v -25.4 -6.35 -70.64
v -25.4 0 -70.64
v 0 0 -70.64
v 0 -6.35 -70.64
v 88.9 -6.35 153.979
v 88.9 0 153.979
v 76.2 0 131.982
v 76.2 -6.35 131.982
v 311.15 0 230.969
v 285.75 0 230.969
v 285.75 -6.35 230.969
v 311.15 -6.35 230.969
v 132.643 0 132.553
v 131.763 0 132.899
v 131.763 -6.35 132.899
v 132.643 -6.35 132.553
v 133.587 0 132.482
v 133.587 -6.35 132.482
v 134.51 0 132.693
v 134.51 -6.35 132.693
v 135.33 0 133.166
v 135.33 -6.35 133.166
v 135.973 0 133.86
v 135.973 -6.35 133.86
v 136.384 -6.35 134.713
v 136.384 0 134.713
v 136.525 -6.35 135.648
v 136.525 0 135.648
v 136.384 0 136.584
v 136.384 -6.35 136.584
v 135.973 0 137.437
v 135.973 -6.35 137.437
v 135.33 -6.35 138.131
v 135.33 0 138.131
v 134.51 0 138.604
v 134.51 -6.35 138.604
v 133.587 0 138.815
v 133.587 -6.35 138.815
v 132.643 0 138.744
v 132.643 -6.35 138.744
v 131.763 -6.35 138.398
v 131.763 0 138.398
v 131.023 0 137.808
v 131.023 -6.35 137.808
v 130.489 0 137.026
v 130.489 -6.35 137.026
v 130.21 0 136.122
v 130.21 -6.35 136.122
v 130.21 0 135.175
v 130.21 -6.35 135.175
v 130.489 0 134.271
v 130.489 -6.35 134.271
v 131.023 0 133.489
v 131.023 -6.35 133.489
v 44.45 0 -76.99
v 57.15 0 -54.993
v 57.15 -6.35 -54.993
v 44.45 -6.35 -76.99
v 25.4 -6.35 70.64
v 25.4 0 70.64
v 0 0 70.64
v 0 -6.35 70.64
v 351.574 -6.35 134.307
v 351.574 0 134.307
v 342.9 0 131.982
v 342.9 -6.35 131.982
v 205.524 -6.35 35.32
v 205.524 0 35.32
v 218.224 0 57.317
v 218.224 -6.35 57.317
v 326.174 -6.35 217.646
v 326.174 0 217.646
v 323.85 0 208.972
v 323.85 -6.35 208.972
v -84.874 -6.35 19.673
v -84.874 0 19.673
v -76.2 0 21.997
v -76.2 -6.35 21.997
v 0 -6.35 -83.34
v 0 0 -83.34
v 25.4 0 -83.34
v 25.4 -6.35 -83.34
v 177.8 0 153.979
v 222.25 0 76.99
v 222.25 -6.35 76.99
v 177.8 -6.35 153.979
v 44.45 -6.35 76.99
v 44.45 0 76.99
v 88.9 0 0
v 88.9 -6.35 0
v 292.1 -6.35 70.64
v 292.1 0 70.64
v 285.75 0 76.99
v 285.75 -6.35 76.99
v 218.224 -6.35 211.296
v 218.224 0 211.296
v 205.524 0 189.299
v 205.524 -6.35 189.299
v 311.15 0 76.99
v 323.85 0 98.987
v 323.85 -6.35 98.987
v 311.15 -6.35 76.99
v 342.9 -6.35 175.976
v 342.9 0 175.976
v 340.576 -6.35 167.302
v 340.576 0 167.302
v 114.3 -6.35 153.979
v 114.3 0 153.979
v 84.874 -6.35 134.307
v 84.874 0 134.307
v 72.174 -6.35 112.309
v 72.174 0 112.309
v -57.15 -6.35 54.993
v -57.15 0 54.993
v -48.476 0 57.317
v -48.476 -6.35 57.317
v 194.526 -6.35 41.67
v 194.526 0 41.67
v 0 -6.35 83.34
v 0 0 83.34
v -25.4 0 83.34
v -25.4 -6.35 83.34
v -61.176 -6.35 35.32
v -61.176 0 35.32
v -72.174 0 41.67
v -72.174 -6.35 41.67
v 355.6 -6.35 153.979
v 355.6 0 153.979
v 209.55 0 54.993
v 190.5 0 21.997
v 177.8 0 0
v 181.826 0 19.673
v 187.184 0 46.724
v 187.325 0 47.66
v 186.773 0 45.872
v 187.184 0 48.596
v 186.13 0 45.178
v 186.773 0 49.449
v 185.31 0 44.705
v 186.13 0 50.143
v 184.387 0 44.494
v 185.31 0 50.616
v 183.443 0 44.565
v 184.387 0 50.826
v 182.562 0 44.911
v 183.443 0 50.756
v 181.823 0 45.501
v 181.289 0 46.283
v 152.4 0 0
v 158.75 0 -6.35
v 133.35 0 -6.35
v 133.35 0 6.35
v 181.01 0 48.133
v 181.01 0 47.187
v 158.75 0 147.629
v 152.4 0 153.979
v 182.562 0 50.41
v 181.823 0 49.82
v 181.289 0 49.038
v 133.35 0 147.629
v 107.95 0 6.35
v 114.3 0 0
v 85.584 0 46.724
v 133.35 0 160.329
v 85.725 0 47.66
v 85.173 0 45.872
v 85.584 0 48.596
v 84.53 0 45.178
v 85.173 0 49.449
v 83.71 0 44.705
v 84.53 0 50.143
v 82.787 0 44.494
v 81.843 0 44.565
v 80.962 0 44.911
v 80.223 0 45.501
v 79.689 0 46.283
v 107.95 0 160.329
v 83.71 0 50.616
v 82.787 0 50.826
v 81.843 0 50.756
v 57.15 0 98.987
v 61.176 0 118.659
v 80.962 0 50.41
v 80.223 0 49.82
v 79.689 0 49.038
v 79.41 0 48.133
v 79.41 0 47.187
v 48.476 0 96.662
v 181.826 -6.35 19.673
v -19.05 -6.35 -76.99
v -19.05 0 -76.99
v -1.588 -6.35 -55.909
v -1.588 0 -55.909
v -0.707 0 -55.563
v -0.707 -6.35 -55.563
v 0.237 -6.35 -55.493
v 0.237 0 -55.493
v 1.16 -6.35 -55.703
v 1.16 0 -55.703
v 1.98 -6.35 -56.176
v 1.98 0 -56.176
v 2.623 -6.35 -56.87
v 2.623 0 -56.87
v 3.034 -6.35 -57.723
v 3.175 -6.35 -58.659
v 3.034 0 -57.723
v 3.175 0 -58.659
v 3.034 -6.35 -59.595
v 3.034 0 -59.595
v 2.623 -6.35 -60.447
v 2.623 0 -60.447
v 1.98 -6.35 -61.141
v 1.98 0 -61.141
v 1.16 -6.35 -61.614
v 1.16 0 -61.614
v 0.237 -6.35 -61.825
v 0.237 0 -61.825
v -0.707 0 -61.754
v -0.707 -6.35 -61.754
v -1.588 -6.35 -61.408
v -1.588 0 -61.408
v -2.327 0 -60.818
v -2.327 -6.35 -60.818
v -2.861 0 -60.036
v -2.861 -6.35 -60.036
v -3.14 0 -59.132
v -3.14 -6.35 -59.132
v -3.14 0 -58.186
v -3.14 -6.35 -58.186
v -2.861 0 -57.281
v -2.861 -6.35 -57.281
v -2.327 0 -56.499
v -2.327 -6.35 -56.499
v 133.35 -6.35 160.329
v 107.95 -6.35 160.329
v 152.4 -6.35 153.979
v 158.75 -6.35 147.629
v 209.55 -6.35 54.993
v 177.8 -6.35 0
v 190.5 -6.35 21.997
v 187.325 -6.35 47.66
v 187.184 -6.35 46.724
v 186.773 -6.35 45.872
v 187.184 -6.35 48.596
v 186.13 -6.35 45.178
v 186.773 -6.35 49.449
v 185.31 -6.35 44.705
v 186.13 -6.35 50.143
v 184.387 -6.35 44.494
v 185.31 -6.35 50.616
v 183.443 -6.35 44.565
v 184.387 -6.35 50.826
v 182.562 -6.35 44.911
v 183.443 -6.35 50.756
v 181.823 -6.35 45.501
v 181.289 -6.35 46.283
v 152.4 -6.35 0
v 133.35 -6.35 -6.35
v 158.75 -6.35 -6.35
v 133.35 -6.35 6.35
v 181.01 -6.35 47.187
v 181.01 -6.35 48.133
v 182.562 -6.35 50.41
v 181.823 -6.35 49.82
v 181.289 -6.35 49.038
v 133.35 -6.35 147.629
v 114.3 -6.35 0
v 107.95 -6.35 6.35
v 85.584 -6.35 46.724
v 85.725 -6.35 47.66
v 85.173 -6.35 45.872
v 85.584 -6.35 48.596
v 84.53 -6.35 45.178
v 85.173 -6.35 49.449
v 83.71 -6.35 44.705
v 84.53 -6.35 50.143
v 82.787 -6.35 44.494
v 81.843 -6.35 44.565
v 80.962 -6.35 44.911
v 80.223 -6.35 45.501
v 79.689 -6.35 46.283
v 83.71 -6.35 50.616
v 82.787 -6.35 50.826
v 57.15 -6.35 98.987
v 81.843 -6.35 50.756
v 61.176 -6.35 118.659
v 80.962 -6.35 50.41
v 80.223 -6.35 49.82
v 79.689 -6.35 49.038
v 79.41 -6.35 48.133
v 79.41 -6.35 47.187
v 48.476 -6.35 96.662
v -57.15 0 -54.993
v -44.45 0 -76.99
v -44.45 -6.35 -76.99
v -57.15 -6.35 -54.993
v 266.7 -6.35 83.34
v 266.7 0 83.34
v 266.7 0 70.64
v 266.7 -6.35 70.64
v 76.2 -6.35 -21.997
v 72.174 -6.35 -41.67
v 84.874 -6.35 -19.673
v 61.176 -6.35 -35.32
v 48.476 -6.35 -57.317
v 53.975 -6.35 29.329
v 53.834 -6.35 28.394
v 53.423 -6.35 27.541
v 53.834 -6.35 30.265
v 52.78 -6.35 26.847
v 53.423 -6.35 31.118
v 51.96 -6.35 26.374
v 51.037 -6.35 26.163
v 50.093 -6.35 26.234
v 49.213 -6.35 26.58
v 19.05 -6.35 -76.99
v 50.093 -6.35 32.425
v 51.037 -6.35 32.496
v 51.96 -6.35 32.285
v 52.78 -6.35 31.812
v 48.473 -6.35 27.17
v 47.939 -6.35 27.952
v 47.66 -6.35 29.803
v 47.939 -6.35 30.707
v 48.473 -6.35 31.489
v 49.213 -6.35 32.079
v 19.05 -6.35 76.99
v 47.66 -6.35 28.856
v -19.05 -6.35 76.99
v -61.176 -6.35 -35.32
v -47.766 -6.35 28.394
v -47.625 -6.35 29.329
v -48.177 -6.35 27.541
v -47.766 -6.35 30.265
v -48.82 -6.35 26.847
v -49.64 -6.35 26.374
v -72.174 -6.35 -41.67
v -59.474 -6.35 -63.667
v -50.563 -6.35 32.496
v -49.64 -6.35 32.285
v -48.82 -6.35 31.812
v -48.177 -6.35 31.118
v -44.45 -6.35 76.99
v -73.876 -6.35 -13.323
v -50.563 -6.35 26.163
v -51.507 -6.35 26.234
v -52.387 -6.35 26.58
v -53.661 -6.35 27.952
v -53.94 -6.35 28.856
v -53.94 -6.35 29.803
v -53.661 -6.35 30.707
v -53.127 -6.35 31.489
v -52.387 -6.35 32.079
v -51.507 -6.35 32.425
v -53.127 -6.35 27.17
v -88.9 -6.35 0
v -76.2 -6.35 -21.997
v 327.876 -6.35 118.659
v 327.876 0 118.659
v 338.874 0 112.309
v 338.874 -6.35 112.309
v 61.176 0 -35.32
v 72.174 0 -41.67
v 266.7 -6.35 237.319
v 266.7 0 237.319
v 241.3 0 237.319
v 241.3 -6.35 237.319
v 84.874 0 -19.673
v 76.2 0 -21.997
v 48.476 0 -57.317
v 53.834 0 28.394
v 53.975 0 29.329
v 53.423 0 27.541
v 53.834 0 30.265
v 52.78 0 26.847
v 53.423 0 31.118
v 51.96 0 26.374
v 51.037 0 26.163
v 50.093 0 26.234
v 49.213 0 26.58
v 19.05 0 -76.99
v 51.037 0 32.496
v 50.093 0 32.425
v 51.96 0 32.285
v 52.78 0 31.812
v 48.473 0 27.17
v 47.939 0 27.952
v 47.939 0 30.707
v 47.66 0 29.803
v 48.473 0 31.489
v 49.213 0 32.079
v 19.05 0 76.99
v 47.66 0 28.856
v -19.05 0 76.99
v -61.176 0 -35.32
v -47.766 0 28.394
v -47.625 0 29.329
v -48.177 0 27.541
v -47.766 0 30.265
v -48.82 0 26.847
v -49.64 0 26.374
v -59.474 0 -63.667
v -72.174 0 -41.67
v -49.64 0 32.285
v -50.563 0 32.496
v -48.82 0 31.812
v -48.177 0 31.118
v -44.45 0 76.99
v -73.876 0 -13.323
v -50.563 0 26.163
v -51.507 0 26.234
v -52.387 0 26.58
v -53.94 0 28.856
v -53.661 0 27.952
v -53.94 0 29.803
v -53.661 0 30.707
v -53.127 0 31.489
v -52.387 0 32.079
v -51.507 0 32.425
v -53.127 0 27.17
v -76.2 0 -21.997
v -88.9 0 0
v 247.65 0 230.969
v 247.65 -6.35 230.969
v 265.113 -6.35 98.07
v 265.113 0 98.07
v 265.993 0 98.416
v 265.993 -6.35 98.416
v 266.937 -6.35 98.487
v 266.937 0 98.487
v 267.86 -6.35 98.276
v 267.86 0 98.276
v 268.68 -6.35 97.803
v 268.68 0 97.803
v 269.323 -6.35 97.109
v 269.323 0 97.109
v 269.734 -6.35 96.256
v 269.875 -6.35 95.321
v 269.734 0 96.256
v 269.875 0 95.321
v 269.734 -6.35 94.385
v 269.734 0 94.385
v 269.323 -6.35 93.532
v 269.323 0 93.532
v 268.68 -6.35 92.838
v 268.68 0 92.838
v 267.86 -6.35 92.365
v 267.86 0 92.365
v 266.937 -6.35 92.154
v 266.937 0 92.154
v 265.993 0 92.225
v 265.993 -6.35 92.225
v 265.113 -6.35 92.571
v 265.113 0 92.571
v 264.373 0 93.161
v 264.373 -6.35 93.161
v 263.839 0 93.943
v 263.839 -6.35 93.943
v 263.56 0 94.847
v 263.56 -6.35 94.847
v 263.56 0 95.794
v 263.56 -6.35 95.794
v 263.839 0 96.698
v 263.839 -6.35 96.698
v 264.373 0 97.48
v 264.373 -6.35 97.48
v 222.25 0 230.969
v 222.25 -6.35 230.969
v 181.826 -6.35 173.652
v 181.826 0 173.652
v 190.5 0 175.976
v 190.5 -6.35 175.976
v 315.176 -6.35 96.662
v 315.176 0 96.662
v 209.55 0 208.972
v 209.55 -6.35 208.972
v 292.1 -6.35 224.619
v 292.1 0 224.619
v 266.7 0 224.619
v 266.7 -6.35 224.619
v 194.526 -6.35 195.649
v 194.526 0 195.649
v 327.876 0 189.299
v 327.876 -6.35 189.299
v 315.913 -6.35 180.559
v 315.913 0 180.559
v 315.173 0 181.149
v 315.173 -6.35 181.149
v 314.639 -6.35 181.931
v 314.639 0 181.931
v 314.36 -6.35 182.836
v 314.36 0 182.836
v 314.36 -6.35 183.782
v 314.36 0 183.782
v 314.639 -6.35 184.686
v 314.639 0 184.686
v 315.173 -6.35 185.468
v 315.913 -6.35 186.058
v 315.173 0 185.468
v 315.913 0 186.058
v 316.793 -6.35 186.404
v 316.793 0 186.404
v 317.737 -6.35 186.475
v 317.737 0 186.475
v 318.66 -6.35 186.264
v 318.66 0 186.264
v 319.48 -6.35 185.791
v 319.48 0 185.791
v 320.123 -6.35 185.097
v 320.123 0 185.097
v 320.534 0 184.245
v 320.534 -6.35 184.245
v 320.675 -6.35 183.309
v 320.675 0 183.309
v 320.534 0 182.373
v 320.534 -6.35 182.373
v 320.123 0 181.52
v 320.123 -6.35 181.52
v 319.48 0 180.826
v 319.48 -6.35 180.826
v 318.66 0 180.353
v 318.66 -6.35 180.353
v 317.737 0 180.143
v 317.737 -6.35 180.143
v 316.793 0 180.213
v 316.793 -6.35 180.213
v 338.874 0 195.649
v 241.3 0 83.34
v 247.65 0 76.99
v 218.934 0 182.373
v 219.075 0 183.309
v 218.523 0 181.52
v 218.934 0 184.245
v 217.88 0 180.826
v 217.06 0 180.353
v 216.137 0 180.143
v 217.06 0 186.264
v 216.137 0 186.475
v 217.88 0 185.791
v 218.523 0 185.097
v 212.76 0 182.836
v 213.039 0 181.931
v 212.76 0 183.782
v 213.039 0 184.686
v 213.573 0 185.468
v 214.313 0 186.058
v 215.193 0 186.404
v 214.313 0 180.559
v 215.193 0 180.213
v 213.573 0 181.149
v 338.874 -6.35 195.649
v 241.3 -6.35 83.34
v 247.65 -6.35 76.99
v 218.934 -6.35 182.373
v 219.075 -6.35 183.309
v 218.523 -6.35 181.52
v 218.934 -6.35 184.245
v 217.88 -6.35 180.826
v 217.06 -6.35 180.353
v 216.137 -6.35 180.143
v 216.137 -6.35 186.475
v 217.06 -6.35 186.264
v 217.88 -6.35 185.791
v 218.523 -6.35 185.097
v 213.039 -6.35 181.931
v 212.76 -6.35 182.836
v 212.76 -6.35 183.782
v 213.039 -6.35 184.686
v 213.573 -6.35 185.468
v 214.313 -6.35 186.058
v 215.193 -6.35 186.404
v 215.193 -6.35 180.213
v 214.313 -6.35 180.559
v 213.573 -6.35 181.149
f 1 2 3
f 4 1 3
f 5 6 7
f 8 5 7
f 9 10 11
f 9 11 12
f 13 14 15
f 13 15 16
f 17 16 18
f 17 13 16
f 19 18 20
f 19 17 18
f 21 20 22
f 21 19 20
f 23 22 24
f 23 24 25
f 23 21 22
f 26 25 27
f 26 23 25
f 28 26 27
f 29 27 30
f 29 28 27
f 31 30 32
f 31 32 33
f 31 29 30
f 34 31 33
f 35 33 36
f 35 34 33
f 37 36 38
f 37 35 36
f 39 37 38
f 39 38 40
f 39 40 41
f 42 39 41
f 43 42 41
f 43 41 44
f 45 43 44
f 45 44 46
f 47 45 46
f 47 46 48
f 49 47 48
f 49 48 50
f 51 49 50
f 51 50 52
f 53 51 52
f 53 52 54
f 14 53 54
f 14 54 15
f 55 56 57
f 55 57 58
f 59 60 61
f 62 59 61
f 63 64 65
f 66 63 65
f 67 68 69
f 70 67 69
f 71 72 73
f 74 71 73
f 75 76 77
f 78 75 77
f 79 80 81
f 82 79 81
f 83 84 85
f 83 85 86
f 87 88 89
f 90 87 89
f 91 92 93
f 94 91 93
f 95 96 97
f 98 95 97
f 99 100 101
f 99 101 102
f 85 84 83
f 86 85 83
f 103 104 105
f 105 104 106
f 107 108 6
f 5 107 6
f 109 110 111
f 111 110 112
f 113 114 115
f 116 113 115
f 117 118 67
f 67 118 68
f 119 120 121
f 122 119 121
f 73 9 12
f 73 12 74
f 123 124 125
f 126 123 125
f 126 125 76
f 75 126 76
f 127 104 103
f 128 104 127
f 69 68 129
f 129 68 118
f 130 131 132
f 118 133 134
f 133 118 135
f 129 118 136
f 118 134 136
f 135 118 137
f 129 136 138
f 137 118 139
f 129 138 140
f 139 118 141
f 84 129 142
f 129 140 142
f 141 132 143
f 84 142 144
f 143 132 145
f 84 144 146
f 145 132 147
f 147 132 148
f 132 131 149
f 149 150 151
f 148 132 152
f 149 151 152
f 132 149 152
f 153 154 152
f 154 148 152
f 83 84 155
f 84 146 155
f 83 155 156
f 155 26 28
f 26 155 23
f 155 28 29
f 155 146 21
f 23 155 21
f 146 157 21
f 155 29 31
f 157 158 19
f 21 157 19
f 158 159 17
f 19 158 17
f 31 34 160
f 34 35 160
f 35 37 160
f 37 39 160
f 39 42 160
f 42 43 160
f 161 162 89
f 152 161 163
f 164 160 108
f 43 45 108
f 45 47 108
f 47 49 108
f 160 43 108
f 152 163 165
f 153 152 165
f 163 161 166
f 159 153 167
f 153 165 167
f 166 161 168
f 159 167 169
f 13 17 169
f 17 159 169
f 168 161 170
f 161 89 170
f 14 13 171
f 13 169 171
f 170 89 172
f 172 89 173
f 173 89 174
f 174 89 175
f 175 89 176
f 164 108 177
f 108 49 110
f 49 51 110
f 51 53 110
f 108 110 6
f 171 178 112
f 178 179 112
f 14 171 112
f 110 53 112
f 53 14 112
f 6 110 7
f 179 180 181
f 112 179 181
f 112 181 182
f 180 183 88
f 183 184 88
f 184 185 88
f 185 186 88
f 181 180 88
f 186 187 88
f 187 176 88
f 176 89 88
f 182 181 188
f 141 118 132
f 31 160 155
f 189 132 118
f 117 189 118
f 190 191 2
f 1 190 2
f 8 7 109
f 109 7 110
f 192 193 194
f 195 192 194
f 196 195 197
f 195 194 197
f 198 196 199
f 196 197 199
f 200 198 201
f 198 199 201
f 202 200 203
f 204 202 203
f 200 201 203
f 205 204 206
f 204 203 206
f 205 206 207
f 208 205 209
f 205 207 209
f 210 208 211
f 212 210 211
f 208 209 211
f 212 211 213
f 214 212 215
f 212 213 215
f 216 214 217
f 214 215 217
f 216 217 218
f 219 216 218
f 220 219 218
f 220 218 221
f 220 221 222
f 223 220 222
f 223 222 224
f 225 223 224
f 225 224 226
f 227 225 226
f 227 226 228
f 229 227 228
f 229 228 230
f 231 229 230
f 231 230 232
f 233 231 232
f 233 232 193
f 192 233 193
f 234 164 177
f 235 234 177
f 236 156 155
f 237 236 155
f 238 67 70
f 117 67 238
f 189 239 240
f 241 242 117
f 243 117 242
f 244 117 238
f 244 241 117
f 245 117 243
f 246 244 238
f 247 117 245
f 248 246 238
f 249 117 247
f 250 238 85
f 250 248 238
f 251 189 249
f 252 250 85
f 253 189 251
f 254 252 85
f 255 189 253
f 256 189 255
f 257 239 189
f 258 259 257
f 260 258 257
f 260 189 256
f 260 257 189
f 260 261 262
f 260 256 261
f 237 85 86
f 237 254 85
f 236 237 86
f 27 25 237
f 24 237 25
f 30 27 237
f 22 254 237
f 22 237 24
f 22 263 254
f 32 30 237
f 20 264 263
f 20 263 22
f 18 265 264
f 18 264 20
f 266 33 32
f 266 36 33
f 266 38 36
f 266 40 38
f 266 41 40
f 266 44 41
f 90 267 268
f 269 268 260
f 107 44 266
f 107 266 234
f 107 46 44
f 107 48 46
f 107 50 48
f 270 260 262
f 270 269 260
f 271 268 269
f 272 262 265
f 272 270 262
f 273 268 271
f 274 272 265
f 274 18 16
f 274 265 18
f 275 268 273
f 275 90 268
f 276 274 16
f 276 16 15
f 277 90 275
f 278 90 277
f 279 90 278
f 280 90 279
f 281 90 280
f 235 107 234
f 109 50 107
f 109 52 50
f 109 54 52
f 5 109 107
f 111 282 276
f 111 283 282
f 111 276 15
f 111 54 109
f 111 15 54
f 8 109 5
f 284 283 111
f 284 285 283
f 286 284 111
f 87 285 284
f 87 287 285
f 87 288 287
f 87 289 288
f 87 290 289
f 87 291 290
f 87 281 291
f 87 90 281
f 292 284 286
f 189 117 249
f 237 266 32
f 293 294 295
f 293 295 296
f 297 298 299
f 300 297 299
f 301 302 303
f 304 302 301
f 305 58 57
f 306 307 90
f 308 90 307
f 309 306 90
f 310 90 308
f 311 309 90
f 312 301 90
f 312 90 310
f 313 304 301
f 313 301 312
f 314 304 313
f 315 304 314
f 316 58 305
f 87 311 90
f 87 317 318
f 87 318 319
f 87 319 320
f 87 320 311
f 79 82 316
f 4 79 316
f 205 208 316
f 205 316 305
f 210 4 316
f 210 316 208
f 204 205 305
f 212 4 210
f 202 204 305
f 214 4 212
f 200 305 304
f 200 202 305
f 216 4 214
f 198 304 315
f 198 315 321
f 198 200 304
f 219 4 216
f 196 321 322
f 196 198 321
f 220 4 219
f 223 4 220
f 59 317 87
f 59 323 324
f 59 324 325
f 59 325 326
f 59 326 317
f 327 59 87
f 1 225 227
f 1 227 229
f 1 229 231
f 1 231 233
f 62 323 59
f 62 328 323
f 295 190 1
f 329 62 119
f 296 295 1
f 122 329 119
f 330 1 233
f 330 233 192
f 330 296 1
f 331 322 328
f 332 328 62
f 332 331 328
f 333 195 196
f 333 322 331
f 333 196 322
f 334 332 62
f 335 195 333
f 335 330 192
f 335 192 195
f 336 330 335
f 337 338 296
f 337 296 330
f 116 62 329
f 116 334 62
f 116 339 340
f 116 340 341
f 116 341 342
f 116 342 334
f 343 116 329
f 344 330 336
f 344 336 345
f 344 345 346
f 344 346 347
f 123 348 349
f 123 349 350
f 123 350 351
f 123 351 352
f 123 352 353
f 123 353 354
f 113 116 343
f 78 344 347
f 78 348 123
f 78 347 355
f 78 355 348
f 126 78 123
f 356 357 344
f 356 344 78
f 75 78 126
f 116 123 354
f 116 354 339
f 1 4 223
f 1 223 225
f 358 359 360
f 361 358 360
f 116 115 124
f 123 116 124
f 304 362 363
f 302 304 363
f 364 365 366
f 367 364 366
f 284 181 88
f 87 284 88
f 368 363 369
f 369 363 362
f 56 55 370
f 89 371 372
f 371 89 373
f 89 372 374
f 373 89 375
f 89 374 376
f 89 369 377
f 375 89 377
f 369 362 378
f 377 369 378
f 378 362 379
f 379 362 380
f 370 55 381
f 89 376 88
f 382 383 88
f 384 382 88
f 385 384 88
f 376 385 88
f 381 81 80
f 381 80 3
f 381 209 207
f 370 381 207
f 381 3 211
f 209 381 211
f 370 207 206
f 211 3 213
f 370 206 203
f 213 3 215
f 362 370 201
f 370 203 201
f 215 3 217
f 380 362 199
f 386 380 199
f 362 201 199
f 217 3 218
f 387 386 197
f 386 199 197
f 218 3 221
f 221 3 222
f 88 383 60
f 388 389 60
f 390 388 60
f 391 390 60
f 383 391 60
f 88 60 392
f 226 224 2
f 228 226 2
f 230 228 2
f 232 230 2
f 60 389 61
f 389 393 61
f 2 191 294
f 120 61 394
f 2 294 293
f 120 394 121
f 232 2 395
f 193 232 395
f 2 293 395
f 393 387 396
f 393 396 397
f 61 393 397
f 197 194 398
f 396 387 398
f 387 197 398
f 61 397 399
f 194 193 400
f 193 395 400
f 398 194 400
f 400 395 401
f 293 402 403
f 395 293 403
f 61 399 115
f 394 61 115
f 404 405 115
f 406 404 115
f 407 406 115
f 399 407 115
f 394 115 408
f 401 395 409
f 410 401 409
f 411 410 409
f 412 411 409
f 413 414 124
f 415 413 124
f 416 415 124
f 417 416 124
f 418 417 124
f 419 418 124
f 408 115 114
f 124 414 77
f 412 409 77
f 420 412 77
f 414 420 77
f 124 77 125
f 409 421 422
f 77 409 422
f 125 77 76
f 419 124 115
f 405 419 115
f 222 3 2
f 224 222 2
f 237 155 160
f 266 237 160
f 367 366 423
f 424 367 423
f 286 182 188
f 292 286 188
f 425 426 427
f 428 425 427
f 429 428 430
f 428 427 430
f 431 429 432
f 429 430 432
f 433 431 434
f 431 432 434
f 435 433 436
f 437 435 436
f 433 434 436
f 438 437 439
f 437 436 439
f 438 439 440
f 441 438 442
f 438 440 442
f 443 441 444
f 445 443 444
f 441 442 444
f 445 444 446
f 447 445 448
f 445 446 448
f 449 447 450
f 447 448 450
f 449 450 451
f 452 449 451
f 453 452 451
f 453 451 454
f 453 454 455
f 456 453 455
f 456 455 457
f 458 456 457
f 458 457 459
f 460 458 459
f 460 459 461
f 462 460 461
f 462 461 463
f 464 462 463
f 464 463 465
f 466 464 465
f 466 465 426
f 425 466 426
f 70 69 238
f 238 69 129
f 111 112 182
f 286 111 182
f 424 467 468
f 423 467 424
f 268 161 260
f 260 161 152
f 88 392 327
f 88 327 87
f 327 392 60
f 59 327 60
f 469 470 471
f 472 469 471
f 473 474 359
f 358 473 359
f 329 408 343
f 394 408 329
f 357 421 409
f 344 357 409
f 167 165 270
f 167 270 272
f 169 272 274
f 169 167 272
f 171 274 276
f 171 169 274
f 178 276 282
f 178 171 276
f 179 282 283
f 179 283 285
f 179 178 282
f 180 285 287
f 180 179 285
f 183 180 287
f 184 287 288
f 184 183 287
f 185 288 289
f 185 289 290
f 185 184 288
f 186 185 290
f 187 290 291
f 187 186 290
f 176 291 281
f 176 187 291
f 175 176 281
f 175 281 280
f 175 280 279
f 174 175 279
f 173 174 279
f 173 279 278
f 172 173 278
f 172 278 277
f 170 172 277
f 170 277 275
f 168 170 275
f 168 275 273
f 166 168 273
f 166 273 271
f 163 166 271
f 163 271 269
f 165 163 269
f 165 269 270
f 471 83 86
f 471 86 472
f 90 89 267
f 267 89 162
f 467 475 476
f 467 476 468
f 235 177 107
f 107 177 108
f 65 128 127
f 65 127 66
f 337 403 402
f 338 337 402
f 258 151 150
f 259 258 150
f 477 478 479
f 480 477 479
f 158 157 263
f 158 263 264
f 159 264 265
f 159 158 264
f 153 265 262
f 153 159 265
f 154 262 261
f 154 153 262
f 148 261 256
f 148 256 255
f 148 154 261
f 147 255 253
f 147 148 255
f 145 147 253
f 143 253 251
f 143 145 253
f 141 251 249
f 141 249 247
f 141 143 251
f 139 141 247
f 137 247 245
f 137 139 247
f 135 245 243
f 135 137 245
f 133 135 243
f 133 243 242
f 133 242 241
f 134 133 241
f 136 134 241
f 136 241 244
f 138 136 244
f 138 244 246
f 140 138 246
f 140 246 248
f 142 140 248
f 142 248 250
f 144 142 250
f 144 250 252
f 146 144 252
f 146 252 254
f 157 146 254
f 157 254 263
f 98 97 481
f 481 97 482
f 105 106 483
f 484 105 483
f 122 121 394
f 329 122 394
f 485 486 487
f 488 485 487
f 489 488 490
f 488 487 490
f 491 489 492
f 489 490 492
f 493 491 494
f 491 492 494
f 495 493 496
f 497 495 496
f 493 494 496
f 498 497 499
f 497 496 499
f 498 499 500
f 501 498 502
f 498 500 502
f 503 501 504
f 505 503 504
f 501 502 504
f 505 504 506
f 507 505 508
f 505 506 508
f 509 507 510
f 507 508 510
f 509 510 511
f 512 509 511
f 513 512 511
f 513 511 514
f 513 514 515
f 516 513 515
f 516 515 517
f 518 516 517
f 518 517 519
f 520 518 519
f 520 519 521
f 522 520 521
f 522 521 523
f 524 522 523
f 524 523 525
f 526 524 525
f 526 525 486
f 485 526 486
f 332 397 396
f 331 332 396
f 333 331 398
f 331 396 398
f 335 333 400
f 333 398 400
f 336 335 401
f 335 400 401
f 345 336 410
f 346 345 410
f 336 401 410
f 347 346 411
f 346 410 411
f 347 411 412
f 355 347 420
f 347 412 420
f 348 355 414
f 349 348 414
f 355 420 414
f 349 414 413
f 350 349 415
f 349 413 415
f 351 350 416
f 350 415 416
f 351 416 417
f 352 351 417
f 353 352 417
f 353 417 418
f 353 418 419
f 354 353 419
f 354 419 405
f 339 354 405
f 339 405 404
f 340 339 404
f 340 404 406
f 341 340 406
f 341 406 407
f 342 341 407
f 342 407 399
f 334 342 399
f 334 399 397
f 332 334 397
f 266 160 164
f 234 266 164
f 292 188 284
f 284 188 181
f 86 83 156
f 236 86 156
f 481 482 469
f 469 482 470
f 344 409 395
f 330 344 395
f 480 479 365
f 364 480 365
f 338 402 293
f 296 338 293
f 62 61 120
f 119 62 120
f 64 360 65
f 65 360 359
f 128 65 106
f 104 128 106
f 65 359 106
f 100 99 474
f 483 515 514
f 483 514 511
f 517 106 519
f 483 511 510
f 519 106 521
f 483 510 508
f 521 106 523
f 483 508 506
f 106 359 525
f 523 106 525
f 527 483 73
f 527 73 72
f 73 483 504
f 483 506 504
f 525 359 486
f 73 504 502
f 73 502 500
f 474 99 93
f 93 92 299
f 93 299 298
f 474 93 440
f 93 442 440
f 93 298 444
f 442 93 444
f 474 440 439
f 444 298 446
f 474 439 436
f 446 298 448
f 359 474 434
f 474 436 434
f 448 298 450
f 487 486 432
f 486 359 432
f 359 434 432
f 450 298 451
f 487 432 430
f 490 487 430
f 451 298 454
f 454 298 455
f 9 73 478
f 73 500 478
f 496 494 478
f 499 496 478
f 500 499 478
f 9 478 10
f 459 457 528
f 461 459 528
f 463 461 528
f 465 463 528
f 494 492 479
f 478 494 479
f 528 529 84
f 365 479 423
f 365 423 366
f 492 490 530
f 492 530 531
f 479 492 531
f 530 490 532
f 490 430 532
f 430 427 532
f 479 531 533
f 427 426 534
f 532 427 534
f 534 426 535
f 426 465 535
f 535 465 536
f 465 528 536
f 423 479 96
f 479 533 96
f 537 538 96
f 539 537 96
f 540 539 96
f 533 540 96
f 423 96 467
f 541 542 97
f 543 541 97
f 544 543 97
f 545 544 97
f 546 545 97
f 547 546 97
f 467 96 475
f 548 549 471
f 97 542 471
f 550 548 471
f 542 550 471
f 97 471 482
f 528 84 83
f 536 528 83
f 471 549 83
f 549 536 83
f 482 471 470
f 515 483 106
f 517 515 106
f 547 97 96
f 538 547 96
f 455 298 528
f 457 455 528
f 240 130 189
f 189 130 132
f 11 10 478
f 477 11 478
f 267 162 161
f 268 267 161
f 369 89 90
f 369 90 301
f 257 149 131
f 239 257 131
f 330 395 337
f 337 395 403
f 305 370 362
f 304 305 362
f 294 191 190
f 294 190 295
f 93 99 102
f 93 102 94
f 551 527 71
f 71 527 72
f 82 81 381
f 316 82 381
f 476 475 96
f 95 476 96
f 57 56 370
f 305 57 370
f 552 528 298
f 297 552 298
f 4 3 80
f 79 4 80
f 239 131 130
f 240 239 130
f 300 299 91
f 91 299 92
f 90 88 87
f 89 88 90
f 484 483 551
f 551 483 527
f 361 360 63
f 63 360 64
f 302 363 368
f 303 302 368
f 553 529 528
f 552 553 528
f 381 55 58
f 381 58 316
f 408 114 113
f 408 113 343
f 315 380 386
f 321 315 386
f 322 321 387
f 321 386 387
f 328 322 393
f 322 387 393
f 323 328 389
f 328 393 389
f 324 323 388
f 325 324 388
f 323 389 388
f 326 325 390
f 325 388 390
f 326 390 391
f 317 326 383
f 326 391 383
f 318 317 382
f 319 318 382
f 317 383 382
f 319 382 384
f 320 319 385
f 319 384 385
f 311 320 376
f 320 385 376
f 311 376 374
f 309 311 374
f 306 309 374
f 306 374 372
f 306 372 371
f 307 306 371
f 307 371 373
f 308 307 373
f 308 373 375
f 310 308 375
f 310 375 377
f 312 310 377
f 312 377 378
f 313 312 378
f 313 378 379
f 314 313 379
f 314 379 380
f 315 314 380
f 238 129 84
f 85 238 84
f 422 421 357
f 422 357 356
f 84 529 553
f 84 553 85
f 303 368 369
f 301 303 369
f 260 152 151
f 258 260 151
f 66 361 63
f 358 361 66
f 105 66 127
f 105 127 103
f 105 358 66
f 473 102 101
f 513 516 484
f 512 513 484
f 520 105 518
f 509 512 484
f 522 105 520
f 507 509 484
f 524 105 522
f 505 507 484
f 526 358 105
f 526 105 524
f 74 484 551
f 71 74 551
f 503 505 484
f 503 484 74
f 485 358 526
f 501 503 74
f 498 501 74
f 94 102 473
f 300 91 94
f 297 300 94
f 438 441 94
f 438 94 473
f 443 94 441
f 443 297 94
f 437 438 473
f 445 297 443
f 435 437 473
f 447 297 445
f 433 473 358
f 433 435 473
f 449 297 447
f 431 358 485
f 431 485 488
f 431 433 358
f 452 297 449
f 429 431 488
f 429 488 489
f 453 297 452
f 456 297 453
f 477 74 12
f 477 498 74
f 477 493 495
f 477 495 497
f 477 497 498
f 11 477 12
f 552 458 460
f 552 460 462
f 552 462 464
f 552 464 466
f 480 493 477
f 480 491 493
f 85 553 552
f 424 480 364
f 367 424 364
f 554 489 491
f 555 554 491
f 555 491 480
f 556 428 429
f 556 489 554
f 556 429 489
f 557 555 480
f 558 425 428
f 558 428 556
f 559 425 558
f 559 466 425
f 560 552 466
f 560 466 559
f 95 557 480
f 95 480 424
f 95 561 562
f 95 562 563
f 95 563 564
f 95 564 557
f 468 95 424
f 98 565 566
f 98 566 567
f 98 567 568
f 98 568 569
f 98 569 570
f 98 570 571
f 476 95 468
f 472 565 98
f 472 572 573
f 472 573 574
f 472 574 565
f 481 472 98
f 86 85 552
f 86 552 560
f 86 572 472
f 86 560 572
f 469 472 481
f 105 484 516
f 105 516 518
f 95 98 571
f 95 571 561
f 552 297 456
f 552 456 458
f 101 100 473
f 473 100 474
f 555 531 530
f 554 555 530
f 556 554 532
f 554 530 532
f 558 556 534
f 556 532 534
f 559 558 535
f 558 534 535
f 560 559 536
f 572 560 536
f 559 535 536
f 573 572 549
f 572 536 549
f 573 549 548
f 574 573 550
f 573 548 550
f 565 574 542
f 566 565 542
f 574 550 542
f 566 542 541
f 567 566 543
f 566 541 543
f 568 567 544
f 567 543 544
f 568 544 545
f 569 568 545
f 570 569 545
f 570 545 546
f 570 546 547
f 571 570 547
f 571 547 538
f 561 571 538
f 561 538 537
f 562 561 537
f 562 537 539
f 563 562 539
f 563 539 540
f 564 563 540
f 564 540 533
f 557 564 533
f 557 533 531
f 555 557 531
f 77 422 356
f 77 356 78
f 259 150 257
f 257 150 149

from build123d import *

# Parameters (mm, degrees)
BOSS_EXTRUDE1_DEPTH = 6.35
SKETCH9_R           = 3.175
CUT_EXTRUDE3_DEPTH  = 7.35
CIRPATTERN6_COUNT   = 3
CUT_EXTRUDE4_DEPTH  = 7.35
BOSS_EXTRUDE4_DEPTH = 6.35
CIRPATTERN7_COUNT   = 6
CUT_EXTRUDE5_DEPTH  = 7.35
BOSS_EXTRUDE5_DEPTH = 6.35
CIRPATTERN8_COUNT   = 6
CUT_EXTRUDE6_DEPTH  = 7.35
BOSS_EXTRUDE6_DEPTH = 6.35
CIRPATTERN9_COUNT   = 6


with BuildPart() as part:
    # Sketch1 → Boss-Extrude1 (new body)
    with BuildSketch(Plane(origin=(0, 0, 0), x_dir=(1, 0, 0), z_dir=(0, 1, 0))):
        Polygon((88.9, 0), (44.45, 76.989658396), (-44.45, 76.989658396), (-88.9, 0), (-44.45, -76.989658396), (44.45, -76.989658396), align=None)
    extrude(amount=-BOSS_EXTRUDE1_DEPTH)

    # Sketch9 → Cut-Extrude3 (cut, through all)
    with BuildSketch(Plane(origin=(0, 0, 0), x_dir=(1, 0, 0), z_dir=(0, 1, 0))):
        with Locations((-50.8, -29.329393675)):
            Circle(SKETCH9_R)
    cut_extrude3 = extrude(amount=-CUT_EXTRUDE3_DEPTH, mode=Mode.SUBTRACT)

    # CirPattern6: Cut-Extrude3 ×3 about axis
    cirpattern6_axis = Axis((0, 0, 0), (0, 1, 0))
    for i in range(1, CIRPATTERN6_COUNT):
        add(cut_extrude3.rotate(cirpattern6_axis, i * 360 / CIRPATTERN6_COUNT), mode=Mode.SUBTRACT)


with BuildPart() as body_2:
    # Mirror3: mirrored copy
    add(part.part.mirror(Plane(origin=(44.45, -6.35, 76.989658396), x_dir=(-0.5, 0, 0.866025404), z_dir=(0.866025404, 0, 0.5))))


with BuildPart() as part_1:
    add(part.part)

    # Sketch10 → Cut-Extrude4 (cut, through all)
    with BuildSketch(Plane(origin=(0, 0, 0), x_dir=(1, 0, 0), z_dir=(0, 1, 0))):
        Polygon((57.15, 54.99261314), (48.475738686, 57.316874454), (61.175738686, 35.319829198), (66.675, 38.494829198), align=None)
    cut_extrude4 = extrude(amount=-CUT_EXTRUDE4_DEPTH, mode=Mode.SUBTRACT)

    # Sketch11 → Boss-Extrude4 (add)
    with BuildSketch(Plane(origin=(0, 0, 0), x_dir=(1, 0, 0), z_dir=(0, 1, 0))):
        Polygon((66.675, 38.494829198), (72.174261314, 41.669829198), (84.874261314, 19.672783942), (76.2, 21.997045256), align=None)
    boss_extrude4 = extrude(amount=-BOSS_EXTRUDE4_DEPTH)

    # CirPattern7: Cut-Extrude4, Boss-Extrude4 ×6 about axis, 1 skipped
    cirpattern7_axis = Axis((0, 0, 0), (0, 1, 0))
    add([cut_extrude4.rotate(cirpattern7_axis, i * 360 / CIRPATTERN7_COUNT) for i in range(1, CIRPATTERN7_COUNT) if i not in (5,)], mode=Mode.SUBTRACT)
    add([boss_extrude4.rotate(cirpattern7_axis, i * 360 / CIRPATTERN7_COUNT) for i in range(1, CIRPATTERN7_COUNT) if i not in (5,)])


with BuildPart() as body_3:
    # Mirror4: mirrored copy
    add(body_2.part.mirror(Plane(origin=(222.25, -6.35, 76.989658396), x_dir=(-0.5, 0, 0.866025404), z_dir=(0.866025404, 0, 0.5))))

    # Sketch16 → Cut-Extrude6 (cut, through all)
    with BuildSketch(Plane(origin=(0, 0, 0), x_dir=(1, 0, 0), z_dir=(0, 1, 0))):
        Polygon((323.85, -98.986703653), (315.175738686, -96.662442339), (327.875738686, -118.659487595), (333.375, -115.484487595), align=None)
    cut_extrude6 = extrude(amount=-CUT_EXTRUDE6_DEPTH, mode=Mode.SUBTRACT)

    # Sketch17 → Boss-Extrude6 (add)
    with BuildSketch(Plane(origin=(0, 0, 0), x_dir=(1, 0, 0), z_dir=(0, 1, 0))):
        Polygon((333.375, -115.484487595), (338.874261314, -112.309487595), (351.574261314, -134.306532851), (342.9, -131.982271537), align=None)
    boss_extrude6 = extrude(amount=-BOSS_EXTRUDE6_DEPTH)

    # CirPattern9: Cut-Extrude6, Boss-Extrude6 ×6 about axis, 1 skipped
    cirpattern9_axis = Axis((266.7, 0, 153.979316793), (0, 1, 0))
    add([cut_extrude6.rotate(cirpattern9_axis, i * 360 / CIRPATTERN9_COUNT) for i in range(1, CIRPATTERN9_COUNT) if i not in (2,)], mode=Mode.SUBTRACT)
    add([boss_extrude6.rotate(cirpattern9_axis, i * 360 / CIRPATTERN9_COUNT) for i in range(1, CIRPATTERN9_COUNT) if i not in (2,)])


with BuildPart() as body_2_1:
    add(body_2.part)

    # Sketch13 → Cut-Extrude5 (cut, through all)
    with BuildSketch(Plane(origin=(0, 0, 0), x_dir=(1, 0, 0), z_dir=(0, 1, 0))):
        Polygon((190.5, -21.997045256), (181.825738686, -19.672783942), (194.525738686, -41.669829198), (200.025, -38.494829198), align=None)
    cut_extrude5 = extrude(amount=-CUT_EXTRUDE5_DEPTH, mode=Mode.SUBTRACT)

    # Sketch14 → Boss-Extrude5 (add)
    with BuildSketch(Plane(origin=(0, 0, 0), x_dir=(1, 0, 0), z_dir=(0, 1, 0))):
        Polygon((200.025, -38.494829198), (205.524261314, -35.319829198), (218.224261314, -57.316874454), (209.55, -54.99261314), align=None)
    boss_extrude5 = extrude(amount=-BOSS_EXTRUDE5_DEPTH)

    # CirPattern8: Cut-Extrude5, Boss-Extrude5 ×6 about axis, 2 skipped
    cirpattern8_axis = Axis((133.35, 0, 76.989658396), (0, 1, 0))
    add([cut_extrude5.rotate(cirpattern8_axis, i * 360 / CIRPATTERN8_COUNT) for i in range(1, CIRPATTERN8_COUNT) if i not in (2, 5)], mode=Mode.SUBTRACT)
    add([boss_extrude5.rotate(cirpattern8_axis, i * 360 / CIRPATTERN8_COUNT) for i in range(1, CIRPATTERN8_COUNT) if i not in (2, 5)])


solid = Compound([part_1.part, body_3.part, body_2_1.part])
